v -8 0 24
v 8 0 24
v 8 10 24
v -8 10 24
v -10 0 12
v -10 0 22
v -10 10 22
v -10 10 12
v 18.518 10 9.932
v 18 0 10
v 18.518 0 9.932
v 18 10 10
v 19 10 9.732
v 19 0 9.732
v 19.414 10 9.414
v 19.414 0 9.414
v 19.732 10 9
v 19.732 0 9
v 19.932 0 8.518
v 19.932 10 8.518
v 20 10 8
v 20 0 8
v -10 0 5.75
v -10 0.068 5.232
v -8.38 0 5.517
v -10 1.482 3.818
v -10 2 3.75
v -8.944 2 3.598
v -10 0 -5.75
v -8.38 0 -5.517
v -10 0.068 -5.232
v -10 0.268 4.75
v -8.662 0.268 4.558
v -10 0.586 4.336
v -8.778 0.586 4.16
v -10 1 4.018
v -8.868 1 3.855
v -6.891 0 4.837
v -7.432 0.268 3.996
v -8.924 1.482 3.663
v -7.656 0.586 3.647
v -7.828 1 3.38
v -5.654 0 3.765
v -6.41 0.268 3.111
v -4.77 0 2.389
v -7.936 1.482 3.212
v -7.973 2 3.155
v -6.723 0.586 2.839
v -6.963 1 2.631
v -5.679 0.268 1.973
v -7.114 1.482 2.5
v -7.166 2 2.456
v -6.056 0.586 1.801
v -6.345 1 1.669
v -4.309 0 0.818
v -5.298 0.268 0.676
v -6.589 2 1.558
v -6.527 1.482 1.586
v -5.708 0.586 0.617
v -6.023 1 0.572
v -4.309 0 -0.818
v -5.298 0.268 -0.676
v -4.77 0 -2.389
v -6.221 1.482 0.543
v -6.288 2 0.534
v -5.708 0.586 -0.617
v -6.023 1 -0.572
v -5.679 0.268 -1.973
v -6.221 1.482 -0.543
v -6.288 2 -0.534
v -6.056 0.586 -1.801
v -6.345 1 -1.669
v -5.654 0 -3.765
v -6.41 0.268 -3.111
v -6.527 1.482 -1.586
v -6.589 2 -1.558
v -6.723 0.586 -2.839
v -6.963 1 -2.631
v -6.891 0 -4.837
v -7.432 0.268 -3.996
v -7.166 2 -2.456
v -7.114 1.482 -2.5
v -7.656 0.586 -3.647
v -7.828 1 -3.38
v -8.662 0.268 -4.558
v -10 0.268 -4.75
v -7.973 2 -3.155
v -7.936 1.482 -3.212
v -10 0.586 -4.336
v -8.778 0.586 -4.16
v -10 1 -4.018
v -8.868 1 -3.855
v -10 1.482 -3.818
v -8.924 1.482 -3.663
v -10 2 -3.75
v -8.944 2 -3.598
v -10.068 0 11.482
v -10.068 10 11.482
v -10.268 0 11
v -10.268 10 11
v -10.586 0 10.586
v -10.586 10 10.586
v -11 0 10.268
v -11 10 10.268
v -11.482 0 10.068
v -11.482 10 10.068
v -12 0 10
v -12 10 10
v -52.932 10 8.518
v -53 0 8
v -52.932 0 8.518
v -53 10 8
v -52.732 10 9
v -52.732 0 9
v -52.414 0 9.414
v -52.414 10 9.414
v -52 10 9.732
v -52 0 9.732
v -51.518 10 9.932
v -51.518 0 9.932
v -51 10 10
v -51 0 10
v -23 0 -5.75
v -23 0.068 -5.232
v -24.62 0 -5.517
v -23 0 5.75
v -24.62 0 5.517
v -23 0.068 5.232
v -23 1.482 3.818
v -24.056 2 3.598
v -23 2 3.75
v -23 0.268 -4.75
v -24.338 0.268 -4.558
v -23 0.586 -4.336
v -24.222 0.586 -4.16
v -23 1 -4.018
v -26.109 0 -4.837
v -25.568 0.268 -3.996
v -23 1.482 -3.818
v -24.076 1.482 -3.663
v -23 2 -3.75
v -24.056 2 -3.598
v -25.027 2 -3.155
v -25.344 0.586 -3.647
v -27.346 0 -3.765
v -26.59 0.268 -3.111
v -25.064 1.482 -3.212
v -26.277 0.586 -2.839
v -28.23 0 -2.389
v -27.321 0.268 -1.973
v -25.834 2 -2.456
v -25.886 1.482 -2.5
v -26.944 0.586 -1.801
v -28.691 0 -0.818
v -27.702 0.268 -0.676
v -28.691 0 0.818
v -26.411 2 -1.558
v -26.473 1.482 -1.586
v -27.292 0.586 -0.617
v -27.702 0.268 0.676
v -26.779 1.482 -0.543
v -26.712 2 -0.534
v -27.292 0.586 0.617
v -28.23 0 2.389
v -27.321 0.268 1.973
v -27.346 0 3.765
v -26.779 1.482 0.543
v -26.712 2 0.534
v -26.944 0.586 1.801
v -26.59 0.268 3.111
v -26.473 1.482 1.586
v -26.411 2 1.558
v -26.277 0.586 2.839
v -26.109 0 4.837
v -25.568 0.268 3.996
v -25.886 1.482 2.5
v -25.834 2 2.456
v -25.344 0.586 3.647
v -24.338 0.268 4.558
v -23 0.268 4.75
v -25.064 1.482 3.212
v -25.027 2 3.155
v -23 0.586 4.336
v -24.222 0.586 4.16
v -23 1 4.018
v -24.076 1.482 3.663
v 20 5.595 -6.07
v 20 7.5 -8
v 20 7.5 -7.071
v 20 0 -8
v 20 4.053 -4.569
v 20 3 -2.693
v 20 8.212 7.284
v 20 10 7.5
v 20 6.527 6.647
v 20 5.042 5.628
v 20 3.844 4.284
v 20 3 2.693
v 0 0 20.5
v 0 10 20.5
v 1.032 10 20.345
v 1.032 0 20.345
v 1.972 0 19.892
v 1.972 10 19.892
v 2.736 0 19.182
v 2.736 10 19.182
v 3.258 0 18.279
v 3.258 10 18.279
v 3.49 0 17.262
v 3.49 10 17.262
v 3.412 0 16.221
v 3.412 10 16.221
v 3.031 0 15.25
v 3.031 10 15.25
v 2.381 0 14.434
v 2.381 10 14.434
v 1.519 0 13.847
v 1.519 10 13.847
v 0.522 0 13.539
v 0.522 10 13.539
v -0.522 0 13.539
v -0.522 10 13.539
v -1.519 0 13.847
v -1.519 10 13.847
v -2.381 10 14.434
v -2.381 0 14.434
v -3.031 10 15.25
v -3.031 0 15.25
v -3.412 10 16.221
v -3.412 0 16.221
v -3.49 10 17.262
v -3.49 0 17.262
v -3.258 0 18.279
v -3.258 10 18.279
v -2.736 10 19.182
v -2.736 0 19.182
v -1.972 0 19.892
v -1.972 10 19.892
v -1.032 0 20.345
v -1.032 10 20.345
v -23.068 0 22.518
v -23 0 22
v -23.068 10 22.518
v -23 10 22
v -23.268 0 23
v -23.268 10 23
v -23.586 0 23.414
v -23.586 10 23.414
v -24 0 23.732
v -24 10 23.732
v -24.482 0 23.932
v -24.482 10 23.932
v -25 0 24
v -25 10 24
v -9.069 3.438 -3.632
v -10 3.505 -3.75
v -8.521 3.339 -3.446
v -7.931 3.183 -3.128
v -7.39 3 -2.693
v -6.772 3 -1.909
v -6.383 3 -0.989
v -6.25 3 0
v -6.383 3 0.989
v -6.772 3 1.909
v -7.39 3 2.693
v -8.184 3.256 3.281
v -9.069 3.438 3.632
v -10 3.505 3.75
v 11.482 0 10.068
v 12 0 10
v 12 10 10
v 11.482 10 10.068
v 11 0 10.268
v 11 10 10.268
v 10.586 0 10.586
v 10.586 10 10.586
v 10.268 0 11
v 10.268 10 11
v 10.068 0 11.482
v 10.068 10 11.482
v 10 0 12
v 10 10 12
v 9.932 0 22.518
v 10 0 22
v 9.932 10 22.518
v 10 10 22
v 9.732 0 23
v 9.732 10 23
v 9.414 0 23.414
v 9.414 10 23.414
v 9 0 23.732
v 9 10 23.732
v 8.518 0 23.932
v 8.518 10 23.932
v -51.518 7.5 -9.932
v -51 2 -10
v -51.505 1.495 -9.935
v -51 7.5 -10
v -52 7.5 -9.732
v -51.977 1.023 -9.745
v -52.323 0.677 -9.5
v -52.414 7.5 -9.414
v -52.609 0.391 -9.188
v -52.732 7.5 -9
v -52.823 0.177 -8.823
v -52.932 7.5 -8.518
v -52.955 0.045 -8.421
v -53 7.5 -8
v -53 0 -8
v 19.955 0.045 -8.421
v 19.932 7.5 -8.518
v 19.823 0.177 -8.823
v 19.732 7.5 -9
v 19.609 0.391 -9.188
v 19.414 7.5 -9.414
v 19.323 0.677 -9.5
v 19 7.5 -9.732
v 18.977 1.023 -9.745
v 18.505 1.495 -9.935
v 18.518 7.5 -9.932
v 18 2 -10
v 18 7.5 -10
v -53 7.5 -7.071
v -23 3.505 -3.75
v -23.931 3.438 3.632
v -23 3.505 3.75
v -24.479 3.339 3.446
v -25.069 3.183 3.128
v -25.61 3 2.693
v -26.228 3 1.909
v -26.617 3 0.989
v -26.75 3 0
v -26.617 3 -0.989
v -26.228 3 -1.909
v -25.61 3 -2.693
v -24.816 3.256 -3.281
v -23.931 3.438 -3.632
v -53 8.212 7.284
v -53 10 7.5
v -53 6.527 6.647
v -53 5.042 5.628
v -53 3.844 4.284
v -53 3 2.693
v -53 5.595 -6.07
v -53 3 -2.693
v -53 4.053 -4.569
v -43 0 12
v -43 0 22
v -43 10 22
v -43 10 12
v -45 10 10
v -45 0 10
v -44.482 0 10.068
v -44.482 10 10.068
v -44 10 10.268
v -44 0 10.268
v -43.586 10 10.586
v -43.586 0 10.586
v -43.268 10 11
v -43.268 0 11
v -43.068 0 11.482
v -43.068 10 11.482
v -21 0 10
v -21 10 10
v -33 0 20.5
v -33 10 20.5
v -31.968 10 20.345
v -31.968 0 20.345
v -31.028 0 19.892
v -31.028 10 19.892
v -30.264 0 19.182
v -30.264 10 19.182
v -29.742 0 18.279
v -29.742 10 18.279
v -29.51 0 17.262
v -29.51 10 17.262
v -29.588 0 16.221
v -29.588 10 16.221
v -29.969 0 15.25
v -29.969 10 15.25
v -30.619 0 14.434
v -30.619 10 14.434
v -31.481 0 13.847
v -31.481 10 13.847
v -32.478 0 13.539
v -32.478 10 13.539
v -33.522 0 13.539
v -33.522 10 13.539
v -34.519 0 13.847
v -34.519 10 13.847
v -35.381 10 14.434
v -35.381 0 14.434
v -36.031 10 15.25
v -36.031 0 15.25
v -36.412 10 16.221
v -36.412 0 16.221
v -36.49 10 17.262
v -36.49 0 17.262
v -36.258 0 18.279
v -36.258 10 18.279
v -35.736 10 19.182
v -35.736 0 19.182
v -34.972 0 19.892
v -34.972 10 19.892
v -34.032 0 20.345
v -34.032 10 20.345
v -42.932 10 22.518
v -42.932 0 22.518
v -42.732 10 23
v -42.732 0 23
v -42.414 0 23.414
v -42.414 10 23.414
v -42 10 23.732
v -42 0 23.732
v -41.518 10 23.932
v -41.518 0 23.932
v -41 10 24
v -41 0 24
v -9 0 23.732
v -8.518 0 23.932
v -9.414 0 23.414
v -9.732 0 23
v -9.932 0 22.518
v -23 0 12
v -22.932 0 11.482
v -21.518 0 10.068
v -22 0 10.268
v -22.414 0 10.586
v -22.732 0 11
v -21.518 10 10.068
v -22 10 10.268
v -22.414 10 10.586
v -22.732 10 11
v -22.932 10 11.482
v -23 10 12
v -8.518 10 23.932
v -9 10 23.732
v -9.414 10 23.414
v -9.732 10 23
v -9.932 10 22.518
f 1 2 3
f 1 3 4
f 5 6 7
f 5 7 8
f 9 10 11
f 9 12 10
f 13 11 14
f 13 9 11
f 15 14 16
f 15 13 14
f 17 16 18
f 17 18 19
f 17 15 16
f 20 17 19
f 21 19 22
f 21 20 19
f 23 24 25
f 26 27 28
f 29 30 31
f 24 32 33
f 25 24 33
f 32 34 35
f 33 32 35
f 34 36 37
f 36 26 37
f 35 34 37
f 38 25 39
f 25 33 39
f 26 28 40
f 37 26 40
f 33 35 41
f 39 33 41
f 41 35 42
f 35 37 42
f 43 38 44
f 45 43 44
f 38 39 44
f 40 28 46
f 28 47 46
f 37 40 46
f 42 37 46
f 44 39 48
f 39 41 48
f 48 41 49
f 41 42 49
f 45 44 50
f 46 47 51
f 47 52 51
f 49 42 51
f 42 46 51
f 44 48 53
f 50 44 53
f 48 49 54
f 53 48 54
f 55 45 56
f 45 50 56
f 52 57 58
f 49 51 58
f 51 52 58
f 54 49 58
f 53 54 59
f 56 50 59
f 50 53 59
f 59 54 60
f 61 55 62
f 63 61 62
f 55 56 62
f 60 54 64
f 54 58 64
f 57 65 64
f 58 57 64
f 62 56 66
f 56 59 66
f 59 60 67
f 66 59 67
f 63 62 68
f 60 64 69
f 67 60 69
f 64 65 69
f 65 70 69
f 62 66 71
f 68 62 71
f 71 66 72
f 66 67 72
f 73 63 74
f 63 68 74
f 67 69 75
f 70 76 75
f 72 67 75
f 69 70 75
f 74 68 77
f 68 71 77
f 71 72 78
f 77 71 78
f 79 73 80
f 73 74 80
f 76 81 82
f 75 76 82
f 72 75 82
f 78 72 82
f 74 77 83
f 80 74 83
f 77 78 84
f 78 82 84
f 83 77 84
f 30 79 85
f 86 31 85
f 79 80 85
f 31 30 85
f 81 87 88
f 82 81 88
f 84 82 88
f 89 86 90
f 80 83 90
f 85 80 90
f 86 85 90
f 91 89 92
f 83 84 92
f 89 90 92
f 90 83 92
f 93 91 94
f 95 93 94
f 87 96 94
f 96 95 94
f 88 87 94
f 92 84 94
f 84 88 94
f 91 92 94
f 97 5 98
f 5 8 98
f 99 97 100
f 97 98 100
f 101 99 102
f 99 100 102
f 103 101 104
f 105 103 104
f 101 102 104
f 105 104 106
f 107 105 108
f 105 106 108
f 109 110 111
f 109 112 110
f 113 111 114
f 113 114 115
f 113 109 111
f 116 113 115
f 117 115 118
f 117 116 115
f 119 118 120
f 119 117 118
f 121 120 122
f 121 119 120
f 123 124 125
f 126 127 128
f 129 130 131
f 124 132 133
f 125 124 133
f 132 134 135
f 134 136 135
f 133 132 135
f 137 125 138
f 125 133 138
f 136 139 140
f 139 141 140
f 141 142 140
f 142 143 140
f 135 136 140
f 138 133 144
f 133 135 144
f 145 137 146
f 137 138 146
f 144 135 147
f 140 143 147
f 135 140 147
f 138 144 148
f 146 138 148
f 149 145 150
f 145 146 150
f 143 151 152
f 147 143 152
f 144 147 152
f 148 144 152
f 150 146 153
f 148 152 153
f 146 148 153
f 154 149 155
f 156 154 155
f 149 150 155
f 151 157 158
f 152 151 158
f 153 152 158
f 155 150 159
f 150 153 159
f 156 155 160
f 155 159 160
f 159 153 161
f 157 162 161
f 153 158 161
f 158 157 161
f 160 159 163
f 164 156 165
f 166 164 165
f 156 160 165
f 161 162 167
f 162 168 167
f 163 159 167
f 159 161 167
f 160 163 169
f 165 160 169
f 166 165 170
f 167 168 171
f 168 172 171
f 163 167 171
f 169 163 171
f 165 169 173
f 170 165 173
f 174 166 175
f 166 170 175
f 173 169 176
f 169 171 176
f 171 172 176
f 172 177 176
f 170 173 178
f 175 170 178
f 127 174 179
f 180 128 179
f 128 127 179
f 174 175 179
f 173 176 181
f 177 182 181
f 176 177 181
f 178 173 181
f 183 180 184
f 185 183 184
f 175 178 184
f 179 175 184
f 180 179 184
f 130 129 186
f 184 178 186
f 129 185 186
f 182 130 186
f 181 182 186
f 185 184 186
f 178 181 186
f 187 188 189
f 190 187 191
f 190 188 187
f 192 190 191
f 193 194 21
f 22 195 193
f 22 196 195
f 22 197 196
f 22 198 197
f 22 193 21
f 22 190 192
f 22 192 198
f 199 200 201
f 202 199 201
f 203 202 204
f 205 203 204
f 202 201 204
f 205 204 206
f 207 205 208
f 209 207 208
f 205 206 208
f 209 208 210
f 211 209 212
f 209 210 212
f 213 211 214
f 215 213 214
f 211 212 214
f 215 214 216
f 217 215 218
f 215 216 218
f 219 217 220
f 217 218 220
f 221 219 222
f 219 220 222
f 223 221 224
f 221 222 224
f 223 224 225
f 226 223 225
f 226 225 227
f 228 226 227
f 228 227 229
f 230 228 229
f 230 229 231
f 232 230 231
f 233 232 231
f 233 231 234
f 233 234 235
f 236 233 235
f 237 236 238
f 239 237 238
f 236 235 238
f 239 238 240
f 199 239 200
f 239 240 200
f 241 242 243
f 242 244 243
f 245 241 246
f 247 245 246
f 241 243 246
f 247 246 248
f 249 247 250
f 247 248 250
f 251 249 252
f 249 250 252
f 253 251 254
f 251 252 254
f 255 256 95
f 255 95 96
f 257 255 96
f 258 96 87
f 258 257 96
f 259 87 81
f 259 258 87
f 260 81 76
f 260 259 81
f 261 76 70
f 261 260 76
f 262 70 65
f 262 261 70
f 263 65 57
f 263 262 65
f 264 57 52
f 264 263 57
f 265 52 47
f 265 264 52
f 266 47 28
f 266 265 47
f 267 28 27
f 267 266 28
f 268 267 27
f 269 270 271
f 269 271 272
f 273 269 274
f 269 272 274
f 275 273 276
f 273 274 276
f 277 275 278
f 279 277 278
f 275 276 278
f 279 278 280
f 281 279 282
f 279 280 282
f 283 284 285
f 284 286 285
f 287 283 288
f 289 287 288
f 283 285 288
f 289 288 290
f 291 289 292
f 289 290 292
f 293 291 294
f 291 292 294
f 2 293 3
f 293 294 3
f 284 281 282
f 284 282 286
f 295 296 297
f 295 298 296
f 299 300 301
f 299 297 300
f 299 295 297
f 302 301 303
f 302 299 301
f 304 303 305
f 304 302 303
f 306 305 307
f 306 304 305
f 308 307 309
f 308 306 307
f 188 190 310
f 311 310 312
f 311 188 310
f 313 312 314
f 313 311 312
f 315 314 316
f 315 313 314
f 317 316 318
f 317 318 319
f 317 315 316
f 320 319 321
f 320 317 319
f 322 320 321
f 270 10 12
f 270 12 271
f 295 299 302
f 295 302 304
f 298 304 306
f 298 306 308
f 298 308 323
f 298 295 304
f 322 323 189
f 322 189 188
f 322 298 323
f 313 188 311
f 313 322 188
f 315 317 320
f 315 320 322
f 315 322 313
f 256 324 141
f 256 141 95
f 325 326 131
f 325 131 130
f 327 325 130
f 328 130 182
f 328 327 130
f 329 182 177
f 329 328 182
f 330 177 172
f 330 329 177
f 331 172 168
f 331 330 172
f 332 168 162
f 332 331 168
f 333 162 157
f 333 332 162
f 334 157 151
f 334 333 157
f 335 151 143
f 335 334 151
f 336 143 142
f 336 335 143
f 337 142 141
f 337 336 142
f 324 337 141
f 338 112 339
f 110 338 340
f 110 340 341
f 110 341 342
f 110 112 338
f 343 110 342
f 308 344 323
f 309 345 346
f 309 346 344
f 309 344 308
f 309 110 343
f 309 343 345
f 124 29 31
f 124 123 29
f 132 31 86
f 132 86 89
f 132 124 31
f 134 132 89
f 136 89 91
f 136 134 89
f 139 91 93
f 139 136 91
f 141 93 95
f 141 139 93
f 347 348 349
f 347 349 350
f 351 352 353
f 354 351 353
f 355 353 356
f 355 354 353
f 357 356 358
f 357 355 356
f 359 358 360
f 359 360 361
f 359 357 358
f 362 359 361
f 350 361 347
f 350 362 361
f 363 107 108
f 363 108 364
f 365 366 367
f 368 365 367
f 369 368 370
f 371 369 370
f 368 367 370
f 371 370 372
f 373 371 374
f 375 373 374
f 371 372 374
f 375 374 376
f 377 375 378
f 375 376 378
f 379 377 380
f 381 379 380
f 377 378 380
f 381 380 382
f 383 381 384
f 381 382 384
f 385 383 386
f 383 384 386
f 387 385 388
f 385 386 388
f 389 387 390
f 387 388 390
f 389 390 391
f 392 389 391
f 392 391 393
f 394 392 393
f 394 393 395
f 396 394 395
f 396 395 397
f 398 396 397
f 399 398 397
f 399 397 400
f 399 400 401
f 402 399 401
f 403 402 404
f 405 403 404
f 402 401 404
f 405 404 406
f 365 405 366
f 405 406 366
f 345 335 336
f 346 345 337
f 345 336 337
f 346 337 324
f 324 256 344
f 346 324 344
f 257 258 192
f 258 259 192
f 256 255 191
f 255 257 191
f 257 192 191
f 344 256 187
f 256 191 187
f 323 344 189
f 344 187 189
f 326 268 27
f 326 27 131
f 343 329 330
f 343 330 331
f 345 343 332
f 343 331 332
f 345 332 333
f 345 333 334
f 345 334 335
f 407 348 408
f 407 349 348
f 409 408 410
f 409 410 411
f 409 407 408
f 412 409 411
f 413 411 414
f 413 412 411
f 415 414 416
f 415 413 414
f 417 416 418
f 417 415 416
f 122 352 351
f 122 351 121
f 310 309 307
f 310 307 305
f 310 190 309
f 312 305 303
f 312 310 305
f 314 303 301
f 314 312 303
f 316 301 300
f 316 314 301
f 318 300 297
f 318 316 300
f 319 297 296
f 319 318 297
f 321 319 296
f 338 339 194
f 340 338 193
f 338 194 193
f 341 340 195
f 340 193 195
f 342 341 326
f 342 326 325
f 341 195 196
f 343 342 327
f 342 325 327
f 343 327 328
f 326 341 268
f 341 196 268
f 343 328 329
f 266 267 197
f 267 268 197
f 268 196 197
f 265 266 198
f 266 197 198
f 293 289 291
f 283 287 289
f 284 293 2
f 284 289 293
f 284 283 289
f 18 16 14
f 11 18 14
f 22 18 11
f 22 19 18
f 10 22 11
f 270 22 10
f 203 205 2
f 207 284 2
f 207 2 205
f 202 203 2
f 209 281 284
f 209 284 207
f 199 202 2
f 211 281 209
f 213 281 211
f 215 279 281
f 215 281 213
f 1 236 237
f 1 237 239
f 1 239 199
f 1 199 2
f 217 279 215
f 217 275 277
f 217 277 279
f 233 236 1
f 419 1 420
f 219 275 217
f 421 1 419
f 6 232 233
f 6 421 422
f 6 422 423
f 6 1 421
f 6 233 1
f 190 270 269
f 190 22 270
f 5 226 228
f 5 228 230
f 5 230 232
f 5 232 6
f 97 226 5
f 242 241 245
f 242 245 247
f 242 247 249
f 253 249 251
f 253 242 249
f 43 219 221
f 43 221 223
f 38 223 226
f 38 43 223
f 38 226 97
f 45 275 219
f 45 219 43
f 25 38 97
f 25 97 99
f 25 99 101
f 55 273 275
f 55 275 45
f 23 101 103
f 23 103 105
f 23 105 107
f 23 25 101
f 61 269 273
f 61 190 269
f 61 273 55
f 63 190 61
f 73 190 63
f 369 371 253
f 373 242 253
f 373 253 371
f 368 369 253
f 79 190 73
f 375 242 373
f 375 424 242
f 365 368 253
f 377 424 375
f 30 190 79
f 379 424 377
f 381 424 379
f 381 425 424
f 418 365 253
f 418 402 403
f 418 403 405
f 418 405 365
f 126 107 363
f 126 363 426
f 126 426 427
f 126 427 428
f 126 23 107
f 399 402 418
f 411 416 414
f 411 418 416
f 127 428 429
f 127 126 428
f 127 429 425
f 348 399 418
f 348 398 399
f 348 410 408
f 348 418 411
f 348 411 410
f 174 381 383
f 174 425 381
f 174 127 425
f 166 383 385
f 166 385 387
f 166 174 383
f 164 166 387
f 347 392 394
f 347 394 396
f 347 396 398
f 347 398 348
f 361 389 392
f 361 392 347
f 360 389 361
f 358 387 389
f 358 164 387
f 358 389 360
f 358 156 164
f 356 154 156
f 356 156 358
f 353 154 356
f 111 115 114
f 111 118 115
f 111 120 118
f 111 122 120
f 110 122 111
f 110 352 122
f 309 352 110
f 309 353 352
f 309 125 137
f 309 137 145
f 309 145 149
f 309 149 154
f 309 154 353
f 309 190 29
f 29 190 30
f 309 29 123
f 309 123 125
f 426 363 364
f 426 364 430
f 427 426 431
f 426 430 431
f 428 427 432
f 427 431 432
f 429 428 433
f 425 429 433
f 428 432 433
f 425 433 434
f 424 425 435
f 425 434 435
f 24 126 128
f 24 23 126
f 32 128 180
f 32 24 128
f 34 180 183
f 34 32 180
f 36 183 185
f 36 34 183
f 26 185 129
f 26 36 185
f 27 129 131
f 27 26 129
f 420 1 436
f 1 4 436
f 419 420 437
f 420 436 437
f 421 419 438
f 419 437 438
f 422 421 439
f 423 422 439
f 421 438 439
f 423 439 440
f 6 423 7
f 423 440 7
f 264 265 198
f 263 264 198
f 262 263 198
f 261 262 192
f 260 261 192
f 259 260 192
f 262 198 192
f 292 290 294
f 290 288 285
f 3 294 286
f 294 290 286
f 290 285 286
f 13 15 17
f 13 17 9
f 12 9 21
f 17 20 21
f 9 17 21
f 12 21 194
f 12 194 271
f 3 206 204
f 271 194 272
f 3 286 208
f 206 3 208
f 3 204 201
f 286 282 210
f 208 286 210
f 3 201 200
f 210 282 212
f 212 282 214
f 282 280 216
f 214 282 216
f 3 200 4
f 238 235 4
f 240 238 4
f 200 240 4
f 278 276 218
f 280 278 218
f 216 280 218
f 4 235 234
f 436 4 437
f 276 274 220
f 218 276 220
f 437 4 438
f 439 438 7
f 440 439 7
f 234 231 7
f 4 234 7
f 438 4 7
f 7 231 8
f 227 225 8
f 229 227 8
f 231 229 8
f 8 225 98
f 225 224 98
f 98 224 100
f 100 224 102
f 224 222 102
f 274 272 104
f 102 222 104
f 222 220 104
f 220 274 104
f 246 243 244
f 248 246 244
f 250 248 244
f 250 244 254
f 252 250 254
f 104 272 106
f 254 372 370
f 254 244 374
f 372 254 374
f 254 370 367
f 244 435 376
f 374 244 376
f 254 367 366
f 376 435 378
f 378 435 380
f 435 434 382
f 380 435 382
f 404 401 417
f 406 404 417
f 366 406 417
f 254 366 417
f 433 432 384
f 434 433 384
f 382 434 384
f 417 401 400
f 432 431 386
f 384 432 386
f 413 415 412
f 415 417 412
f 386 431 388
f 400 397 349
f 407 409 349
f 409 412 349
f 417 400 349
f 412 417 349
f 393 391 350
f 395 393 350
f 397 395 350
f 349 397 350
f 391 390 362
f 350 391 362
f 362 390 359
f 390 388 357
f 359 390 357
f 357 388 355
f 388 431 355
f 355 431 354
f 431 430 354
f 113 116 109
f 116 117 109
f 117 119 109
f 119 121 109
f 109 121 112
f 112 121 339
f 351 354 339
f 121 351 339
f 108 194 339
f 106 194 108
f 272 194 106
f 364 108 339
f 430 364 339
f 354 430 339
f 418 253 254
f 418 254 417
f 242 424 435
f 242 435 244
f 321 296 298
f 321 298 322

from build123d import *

# Parameters (mm, degrees)
BOSS_EXTRUDE1_DEPTH       = 10
SKETCH2_R                 = 3.5
CUT_EXTRUDE1_DEPTH        = 10
CUT_EXTRUDE2_DEPTH        = 78.491935064
FILLET1_R                 = 2
MOVE_START                = 7.5
MOVE_FACE1_DEPTH          = 2.5
USB_C_CHARGE_ACCESS_DEPTH = 5
FILLET3_R                 = 2


# Read off the part's stored shape, not the designer's step: Move Face1
with BuildPart() as part:
    # Sketch1 → Boss-Extrude1 (new body)
    with BuildSketch(Plane(origin=(0, 0, 0), x_dir=(1, 0, 0), z_dir=(0, 1, 0))):
        Polygon((20, -10), (10, -10), (10, -24), (-10, -24), (-10, -10), (-23, -10), (-23, -24), (-43, -24), (-43, -10), (-53, -10), (-53, 10), (20, 10), align=None)
    extrude(amount=BOSS_EXTRUDE1_DEPTH)

    # Sketch2 → Cut-Extrude1 (cut)
    with BuildSketch(Plane(origin=(0, 10, 0), x_dir=(1, 0, 0), z_dir=(0, 1, 0))):
        with Locations(Location((0, -17, 0), (0, 0, 270))):
            Circle(SKETCH2_R)
        with Locations(Location((-33, -17, 0), (0, 0, 270))):
            Circle(SKETCH2_R)
    extrude(amount=-CUT_EXTRUDE1_DEPTH, mode=Mode.SUBTRACT)

    # Sketch3 → Cut-Extrude2 (cut, through all)
    with BuildSketch(Plane(origin=(20, 0, 0), x_dir=(0, 0, -1), z_dir=(1, 0, 0))):
        with BuildLine():
            Line((-2.692582404, 3), (2.692582404, 3))
            ThreePointArc((2.692582404, 3), (0, 17.5), (-2.692582404, 3))
        make_face()
    extrude(amount=-CUT_EXTRUDE2_DEPTH, mode=Mode.SUBTRACT)

    # Fillet1
    fillet1_edges = [part.edges().sort_by_distance(p)[0] for p in [
        (-16.5, 0, -10),
        (20, 5, 10),
        (10, 5, 10),
        (10, 5, 24),
        (-10, 5, 24),
        (-10, 5, 10),
        (-23, 5, 10),
        (-23, 5, 24),
        (-43, 5, 24),
        (-43, 5, 10),
        (-53, 5, 10),
        (-53, 5, -10),
        (20, 5, -10),
    ]]
    fillet(fillet1_edges, radius=FILLET1_R)

    # Move Face1 outline → Move Face1 (cut)
    with BuildSketch(Plane(origin=(0, 0, 0), x_dir=(1, 0, 0), z_dir=(0, 1, 0)).offset(MOVE_START)):
        with BuildLine():
            Line((18, 10), (-51, 10))
            ThreePointArc((-51, 10), (-52.414213562, 9.414213562), (-53, 8))
            Line((-53, 8), (-53.000000001, 6))
            Line((-53.000000001, 6), (20.000000001, 6))
            Line((20.000000001, 6), (20, 8))
            ThreePointArc((20, 8), (19.414213562, 9.414213562), (18, 10))
        make_face()
    extrude(amount=MOVE_FACE1_DEPTH, mode=Mode.SUBTRACT)

    # Sketch4 → USB-C charge access (cut, symmetric)
    with BuildSketch(Plane(origin=(0, 3, 0), x_dir=(1, 0, 0), z_dir=(0, 1, 0))):
        with BuildLine():
            Line((-10, -3.75), (-23, -3.75))
            ThreePointArc((-23, -3.75), (-26.75, 0), (-23, 3.75))
            Line((-23, 3.75), (-10, 3.75))
            ThreePointArc((-10, 3.75), (-6.25, 0), (-10, -3.75))
        make_face()
    extrude(amount=USB_C_CHARGE_ACCESS_DEPTH, both=True, mode=Mode.SUBTRACT)

    # Fillet3
    fillet3_edges = [part.edges().sort_by_distance(p)[0] for p in [
        (-16.5, 0, 3.75),
        (-16.5, 0, -3.75),
        (-6.25, 0, 0),
        (-26.75, 0, 0),
    ]]
    fillet(fillet3_edges, radius=FILLET3_R)


solid = part.part
